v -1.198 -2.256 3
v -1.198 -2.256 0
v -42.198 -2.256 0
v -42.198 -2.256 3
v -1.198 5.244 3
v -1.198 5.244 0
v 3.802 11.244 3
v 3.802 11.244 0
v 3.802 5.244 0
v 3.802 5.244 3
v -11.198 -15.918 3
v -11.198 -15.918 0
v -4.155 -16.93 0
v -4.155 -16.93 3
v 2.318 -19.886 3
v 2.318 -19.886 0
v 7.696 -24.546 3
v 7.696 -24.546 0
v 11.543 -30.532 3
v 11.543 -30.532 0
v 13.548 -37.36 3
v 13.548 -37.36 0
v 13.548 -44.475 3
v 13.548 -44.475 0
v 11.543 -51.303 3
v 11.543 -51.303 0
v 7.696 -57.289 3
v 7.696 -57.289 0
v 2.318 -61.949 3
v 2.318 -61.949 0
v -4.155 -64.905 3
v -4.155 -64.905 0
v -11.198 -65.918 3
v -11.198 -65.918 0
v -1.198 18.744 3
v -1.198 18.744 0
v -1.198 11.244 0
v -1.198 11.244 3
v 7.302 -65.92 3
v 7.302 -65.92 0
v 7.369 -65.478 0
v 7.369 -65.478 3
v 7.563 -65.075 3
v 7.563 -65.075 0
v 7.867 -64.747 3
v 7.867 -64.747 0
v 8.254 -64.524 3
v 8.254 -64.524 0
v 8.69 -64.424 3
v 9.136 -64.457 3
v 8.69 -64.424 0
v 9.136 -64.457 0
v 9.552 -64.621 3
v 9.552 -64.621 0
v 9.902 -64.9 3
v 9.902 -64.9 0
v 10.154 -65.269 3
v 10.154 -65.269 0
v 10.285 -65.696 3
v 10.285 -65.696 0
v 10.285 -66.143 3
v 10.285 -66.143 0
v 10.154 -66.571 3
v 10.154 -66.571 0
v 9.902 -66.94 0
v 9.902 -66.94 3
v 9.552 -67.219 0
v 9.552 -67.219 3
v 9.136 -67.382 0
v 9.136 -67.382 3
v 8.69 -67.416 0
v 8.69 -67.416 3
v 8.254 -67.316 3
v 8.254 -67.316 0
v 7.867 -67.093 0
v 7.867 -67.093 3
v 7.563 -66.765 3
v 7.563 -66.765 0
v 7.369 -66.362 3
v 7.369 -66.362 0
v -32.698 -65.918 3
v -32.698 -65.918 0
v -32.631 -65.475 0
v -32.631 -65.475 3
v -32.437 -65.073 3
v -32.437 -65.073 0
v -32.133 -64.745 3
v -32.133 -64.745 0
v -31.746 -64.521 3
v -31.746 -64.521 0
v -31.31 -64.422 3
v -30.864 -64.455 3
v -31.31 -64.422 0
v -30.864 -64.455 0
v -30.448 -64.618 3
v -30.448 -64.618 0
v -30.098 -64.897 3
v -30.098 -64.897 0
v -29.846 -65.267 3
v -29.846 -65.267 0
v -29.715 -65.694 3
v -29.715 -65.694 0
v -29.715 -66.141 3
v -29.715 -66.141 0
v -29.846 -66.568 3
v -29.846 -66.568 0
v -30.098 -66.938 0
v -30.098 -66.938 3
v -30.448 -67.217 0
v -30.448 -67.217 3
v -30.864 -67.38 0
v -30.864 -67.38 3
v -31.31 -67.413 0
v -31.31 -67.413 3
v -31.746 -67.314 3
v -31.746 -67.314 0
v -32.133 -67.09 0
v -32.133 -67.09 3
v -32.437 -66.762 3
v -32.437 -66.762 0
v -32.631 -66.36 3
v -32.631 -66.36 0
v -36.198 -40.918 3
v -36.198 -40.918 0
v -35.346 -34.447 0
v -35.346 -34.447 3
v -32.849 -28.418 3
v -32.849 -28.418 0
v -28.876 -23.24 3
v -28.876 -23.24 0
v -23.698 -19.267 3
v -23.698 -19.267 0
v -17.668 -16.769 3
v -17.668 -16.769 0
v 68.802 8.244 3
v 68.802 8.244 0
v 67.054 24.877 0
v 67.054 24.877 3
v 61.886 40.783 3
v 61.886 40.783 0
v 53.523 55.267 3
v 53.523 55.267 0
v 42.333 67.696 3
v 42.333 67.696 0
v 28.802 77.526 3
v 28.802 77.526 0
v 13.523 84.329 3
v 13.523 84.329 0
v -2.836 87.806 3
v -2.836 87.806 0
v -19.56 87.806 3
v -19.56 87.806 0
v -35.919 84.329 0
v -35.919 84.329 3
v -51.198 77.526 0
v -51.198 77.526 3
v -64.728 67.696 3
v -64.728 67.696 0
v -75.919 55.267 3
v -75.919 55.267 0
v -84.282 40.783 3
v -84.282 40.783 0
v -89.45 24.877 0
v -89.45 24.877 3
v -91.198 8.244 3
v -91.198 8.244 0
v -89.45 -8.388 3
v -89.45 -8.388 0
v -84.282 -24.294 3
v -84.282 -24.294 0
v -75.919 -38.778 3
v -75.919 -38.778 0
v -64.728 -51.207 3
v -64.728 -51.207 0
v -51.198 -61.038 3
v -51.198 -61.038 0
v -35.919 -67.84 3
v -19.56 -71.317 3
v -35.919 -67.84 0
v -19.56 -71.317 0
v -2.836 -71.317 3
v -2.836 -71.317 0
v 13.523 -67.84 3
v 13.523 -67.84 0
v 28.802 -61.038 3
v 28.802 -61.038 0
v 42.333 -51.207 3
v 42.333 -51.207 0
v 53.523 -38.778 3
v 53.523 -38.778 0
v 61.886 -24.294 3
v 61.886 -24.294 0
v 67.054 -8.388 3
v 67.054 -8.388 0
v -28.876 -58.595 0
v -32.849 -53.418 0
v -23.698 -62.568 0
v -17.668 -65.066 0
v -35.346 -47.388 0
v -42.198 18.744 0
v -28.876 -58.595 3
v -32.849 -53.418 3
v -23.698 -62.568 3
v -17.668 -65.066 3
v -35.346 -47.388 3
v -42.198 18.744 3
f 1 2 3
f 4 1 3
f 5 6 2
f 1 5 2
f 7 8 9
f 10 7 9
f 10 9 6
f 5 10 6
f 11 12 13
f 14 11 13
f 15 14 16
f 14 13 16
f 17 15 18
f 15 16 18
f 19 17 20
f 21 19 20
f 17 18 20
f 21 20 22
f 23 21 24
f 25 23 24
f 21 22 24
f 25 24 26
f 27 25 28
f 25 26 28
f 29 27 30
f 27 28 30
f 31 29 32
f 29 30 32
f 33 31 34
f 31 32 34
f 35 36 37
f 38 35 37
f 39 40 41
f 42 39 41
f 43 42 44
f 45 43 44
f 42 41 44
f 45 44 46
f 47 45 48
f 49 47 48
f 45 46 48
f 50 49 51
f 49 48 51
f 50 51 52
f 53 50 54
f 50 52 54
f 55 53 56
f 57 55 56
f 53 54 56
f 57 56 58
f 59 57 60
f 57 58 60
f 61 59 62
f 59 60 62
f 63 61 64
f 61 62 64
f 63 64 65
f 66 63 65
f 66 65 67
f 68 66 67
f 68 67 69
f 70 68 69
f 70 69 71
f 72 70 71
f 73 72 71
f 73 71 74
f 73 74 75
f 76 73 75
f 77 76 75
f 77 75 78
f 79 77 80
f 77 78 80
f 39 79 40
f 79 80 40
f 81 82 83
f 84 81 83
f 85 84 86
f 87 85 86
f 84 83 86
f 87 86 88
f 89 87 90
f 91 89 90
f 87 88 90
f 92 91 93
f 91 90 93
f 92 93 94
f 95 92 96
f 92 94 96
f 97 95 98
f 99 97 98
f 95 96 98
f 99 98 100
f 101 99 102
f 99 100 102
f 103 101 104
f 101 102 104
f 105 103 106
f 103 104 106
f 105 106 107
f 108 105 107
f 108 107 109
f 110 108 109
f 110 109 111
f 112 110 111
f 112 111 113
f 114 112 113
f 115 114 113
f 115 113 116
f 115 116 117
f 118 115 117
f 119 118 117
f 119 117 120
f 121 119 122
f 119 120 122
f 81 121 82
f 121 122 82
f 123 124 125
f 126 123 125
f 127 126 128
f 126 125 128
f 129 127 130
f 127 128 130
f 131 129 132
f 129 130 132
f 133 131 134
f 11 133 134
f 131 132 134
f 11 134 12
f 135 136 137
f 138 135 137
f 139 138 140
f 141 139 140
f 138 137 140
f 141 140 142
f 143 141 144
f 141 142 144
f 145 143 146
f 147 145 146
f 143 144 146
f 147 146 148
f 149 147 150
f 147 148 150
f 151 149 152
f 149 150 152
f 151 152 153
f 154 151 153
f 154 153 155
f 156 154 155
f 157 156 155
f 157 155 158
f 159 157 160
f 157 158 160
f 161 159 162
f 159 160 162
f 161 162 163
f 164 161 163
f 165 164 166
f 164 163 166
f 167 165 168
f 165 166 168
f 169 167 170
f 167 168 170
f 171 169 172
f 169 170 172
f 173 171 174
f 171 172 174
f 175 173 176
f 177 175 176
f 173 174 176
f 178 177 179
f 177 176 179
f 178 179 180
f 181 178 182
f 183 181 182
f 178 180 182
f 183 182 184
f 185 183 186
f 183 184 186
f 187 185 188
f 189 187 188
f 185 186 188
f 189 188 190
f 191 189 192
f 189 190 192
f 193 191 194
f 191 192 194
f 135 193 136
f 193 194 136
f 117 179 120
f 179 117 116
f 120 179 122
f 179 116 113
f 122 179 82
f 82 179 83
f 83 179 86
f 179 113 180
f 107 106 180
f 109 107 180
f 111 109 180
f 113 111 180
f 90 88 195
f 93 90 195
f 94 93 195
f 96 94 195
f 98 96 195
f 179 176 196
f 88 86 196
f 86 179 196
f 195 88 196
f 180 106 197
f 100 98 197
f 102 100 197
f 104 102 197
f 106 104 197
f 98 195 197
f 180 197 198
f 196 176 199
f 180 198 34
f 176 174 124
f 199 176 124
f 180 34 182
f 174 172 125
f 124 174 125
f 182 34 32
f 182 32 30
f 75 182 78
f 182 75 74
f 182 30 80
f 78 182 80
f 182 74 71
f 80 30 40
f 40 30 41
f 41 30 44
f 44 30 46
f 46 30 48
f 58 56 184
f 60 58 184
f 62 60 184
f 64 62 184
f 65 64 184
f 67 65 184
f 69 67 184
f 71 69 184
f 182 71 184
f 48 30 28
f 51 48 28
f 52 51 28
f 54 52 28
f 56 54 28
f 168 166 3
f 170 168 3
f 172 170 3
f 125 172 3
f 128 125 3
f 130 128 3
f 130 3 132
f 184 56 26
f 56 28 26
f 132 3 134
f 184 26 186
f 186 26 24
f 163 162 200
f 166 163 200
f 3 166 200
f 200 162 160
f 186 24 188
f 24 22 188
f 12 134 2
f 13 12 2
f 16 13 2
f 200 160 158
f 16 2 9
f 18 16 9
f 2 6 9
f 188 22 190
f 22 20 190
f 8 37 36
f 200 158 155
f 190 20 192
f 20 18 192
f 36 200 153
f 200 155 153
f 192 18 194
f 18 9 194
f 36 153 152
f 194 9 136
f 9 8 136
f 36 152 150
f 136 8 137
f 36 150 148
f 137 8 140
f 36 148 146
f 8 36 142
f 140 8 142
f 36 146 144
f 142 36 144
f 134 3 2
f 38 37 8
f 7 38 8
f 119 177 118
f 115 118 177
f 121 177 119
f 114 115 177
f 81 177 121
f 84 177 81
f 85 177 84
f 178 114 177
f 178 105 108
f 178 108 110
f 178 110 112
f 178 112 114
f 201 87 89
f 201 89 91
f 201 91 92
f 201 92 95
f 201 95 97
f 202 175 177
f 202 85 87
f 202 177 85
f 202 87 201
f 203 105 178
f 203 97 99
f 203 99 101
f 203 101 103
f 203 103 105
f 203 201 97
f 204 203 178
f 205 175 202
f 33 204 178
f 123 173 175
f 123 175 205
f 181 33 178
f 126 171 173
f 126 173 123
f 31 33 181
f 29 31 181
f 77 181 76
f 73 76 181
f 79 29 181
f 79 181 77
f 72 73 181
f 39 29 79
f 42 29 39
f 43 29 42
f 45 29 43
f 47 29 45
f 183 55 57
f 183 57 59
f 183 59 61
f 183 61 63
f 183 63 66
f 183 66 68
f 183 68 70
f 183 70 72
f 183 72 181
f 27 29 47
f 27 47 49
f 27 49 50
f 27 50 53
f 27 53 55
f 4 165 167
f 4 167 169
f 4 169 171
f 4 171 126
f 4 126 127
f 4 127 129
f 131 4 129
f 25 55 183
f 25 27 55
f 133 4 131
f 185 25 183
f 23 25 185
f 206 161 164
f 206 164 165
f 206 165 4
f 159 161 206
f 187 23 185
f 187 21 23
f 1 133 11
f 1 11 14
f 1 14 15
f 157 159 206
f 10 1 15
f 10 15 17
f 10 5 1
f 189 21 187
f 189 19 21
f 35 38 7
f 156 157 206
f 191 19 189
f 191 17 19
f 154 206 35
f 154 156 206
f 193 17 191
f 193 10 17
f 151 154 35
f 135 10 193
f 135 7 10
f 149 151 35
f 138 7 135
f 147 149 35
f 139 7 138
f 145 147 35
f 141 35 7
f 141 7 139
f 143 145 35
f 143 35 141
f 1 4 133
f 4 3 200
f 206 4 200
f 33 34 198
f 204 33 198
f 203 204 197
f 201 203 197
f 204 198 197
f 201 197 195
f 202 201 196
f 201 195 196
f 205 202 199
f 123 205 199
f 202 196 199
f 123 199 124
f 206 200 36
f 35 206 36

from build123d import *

# Parameters (mm, degrees)
ESQUISSE1_R              = 80
BOSS_EXTRU_1_DEPTH       = 3
ESQUISSE2_R              = 1
ENL_V_MAT_EXTRU_1_DEPTH  = 3
ESQUISSE3_R              = 1.5
ENL_V_MAT_EXTRU_10_DEPTH = 3


with BuildPart() as part:
    # Esquisse1 → Boss.-Extru.1 (new body)
    with BuildSketch(Plane.XY):
        with Locations((-11.197924537, 8.24446622)):
            Circle(ESQUISSE1_R)
    extrude(amount=BOSS_EXTRU_1_DEPTH)

    # Esquisse2 → Enlèv. mat.-Extru.1 (cut)
    # profile 1 of 2: a face of its own
    with BuildSketch(Plane(origin=(0, 0, 0), x_dir=(-1, 0, 0), z_dir=(0, 0, -1))):
        Polygon((-3.802075463, 11.24446622), (-3.802075463, 5.24446622), (1.197924537, 5.24446622), (1.197924537, -2.25553378), (42.197924537, -2.25553378), (42.197924537, 18.74446622), (1.197924537, 18.74446622), (1.197924537, 11.24446622), align=None)
        with Locations((11.197924537, 8.24446622)):
            Circle(ESQUISSE2_R, mode=Mode.SUBTRACT)
    # profile 2 of 2: a face of its own
    with BuildSketch(Plane(origin=(0, 0, 0), x_dir=(-1, 0, 0), z_dir=(0, 0, -1))):
        with Locations((11.197924537, 8.24446622)):
            Circle(ESQUISSE2_R)
    extrude(amount=-ENL_V_MAT_EXTRU_1_DEPTH, mode=Mode.SUBTRACT)

    # Esquisse3 → Enlèv. mat.-Extru.10 (cut)
    with BuildSketch(Plane(origin=(0, 0, 0), x_dir=(-1, 0, 0), z_dir=(0, 0, -1))):
        with BuildLine():
            ThreePointArc((36.197924537, -40.917518651), (28.875594067, -23.239849121), (11.197924537, -15.917518651))
            Line((11.197924537, -15.917518651), (11.197924537, -65.917518651))
            ThreePointArc((11.197924537, -65.917518651), (28.875594067, -58.59518818), (36.197924537, -40.917518651))
        make_face()
        with BuildLine():
            Line((11.197924537, -65.917518651), (11.197924537, -15.917518651))
            ThreePointArc((11.197924537, -15.917518651), (-13.802075463, -40.917518651), (11.197924537, -65.917518651))
        make_face()
        with Locations((-8.802075463, -65.919884489)):
            Circle(ESQUISSE3_R)
        with Locations((31.197924537, -65.917518651)):
            Circle(ESQUISSE3_R)
    extrude(amount=-ENL_V_MAT_EXTRU_10_DEPTH, mode=Mode.SUBTRACT)


solid = part.part
